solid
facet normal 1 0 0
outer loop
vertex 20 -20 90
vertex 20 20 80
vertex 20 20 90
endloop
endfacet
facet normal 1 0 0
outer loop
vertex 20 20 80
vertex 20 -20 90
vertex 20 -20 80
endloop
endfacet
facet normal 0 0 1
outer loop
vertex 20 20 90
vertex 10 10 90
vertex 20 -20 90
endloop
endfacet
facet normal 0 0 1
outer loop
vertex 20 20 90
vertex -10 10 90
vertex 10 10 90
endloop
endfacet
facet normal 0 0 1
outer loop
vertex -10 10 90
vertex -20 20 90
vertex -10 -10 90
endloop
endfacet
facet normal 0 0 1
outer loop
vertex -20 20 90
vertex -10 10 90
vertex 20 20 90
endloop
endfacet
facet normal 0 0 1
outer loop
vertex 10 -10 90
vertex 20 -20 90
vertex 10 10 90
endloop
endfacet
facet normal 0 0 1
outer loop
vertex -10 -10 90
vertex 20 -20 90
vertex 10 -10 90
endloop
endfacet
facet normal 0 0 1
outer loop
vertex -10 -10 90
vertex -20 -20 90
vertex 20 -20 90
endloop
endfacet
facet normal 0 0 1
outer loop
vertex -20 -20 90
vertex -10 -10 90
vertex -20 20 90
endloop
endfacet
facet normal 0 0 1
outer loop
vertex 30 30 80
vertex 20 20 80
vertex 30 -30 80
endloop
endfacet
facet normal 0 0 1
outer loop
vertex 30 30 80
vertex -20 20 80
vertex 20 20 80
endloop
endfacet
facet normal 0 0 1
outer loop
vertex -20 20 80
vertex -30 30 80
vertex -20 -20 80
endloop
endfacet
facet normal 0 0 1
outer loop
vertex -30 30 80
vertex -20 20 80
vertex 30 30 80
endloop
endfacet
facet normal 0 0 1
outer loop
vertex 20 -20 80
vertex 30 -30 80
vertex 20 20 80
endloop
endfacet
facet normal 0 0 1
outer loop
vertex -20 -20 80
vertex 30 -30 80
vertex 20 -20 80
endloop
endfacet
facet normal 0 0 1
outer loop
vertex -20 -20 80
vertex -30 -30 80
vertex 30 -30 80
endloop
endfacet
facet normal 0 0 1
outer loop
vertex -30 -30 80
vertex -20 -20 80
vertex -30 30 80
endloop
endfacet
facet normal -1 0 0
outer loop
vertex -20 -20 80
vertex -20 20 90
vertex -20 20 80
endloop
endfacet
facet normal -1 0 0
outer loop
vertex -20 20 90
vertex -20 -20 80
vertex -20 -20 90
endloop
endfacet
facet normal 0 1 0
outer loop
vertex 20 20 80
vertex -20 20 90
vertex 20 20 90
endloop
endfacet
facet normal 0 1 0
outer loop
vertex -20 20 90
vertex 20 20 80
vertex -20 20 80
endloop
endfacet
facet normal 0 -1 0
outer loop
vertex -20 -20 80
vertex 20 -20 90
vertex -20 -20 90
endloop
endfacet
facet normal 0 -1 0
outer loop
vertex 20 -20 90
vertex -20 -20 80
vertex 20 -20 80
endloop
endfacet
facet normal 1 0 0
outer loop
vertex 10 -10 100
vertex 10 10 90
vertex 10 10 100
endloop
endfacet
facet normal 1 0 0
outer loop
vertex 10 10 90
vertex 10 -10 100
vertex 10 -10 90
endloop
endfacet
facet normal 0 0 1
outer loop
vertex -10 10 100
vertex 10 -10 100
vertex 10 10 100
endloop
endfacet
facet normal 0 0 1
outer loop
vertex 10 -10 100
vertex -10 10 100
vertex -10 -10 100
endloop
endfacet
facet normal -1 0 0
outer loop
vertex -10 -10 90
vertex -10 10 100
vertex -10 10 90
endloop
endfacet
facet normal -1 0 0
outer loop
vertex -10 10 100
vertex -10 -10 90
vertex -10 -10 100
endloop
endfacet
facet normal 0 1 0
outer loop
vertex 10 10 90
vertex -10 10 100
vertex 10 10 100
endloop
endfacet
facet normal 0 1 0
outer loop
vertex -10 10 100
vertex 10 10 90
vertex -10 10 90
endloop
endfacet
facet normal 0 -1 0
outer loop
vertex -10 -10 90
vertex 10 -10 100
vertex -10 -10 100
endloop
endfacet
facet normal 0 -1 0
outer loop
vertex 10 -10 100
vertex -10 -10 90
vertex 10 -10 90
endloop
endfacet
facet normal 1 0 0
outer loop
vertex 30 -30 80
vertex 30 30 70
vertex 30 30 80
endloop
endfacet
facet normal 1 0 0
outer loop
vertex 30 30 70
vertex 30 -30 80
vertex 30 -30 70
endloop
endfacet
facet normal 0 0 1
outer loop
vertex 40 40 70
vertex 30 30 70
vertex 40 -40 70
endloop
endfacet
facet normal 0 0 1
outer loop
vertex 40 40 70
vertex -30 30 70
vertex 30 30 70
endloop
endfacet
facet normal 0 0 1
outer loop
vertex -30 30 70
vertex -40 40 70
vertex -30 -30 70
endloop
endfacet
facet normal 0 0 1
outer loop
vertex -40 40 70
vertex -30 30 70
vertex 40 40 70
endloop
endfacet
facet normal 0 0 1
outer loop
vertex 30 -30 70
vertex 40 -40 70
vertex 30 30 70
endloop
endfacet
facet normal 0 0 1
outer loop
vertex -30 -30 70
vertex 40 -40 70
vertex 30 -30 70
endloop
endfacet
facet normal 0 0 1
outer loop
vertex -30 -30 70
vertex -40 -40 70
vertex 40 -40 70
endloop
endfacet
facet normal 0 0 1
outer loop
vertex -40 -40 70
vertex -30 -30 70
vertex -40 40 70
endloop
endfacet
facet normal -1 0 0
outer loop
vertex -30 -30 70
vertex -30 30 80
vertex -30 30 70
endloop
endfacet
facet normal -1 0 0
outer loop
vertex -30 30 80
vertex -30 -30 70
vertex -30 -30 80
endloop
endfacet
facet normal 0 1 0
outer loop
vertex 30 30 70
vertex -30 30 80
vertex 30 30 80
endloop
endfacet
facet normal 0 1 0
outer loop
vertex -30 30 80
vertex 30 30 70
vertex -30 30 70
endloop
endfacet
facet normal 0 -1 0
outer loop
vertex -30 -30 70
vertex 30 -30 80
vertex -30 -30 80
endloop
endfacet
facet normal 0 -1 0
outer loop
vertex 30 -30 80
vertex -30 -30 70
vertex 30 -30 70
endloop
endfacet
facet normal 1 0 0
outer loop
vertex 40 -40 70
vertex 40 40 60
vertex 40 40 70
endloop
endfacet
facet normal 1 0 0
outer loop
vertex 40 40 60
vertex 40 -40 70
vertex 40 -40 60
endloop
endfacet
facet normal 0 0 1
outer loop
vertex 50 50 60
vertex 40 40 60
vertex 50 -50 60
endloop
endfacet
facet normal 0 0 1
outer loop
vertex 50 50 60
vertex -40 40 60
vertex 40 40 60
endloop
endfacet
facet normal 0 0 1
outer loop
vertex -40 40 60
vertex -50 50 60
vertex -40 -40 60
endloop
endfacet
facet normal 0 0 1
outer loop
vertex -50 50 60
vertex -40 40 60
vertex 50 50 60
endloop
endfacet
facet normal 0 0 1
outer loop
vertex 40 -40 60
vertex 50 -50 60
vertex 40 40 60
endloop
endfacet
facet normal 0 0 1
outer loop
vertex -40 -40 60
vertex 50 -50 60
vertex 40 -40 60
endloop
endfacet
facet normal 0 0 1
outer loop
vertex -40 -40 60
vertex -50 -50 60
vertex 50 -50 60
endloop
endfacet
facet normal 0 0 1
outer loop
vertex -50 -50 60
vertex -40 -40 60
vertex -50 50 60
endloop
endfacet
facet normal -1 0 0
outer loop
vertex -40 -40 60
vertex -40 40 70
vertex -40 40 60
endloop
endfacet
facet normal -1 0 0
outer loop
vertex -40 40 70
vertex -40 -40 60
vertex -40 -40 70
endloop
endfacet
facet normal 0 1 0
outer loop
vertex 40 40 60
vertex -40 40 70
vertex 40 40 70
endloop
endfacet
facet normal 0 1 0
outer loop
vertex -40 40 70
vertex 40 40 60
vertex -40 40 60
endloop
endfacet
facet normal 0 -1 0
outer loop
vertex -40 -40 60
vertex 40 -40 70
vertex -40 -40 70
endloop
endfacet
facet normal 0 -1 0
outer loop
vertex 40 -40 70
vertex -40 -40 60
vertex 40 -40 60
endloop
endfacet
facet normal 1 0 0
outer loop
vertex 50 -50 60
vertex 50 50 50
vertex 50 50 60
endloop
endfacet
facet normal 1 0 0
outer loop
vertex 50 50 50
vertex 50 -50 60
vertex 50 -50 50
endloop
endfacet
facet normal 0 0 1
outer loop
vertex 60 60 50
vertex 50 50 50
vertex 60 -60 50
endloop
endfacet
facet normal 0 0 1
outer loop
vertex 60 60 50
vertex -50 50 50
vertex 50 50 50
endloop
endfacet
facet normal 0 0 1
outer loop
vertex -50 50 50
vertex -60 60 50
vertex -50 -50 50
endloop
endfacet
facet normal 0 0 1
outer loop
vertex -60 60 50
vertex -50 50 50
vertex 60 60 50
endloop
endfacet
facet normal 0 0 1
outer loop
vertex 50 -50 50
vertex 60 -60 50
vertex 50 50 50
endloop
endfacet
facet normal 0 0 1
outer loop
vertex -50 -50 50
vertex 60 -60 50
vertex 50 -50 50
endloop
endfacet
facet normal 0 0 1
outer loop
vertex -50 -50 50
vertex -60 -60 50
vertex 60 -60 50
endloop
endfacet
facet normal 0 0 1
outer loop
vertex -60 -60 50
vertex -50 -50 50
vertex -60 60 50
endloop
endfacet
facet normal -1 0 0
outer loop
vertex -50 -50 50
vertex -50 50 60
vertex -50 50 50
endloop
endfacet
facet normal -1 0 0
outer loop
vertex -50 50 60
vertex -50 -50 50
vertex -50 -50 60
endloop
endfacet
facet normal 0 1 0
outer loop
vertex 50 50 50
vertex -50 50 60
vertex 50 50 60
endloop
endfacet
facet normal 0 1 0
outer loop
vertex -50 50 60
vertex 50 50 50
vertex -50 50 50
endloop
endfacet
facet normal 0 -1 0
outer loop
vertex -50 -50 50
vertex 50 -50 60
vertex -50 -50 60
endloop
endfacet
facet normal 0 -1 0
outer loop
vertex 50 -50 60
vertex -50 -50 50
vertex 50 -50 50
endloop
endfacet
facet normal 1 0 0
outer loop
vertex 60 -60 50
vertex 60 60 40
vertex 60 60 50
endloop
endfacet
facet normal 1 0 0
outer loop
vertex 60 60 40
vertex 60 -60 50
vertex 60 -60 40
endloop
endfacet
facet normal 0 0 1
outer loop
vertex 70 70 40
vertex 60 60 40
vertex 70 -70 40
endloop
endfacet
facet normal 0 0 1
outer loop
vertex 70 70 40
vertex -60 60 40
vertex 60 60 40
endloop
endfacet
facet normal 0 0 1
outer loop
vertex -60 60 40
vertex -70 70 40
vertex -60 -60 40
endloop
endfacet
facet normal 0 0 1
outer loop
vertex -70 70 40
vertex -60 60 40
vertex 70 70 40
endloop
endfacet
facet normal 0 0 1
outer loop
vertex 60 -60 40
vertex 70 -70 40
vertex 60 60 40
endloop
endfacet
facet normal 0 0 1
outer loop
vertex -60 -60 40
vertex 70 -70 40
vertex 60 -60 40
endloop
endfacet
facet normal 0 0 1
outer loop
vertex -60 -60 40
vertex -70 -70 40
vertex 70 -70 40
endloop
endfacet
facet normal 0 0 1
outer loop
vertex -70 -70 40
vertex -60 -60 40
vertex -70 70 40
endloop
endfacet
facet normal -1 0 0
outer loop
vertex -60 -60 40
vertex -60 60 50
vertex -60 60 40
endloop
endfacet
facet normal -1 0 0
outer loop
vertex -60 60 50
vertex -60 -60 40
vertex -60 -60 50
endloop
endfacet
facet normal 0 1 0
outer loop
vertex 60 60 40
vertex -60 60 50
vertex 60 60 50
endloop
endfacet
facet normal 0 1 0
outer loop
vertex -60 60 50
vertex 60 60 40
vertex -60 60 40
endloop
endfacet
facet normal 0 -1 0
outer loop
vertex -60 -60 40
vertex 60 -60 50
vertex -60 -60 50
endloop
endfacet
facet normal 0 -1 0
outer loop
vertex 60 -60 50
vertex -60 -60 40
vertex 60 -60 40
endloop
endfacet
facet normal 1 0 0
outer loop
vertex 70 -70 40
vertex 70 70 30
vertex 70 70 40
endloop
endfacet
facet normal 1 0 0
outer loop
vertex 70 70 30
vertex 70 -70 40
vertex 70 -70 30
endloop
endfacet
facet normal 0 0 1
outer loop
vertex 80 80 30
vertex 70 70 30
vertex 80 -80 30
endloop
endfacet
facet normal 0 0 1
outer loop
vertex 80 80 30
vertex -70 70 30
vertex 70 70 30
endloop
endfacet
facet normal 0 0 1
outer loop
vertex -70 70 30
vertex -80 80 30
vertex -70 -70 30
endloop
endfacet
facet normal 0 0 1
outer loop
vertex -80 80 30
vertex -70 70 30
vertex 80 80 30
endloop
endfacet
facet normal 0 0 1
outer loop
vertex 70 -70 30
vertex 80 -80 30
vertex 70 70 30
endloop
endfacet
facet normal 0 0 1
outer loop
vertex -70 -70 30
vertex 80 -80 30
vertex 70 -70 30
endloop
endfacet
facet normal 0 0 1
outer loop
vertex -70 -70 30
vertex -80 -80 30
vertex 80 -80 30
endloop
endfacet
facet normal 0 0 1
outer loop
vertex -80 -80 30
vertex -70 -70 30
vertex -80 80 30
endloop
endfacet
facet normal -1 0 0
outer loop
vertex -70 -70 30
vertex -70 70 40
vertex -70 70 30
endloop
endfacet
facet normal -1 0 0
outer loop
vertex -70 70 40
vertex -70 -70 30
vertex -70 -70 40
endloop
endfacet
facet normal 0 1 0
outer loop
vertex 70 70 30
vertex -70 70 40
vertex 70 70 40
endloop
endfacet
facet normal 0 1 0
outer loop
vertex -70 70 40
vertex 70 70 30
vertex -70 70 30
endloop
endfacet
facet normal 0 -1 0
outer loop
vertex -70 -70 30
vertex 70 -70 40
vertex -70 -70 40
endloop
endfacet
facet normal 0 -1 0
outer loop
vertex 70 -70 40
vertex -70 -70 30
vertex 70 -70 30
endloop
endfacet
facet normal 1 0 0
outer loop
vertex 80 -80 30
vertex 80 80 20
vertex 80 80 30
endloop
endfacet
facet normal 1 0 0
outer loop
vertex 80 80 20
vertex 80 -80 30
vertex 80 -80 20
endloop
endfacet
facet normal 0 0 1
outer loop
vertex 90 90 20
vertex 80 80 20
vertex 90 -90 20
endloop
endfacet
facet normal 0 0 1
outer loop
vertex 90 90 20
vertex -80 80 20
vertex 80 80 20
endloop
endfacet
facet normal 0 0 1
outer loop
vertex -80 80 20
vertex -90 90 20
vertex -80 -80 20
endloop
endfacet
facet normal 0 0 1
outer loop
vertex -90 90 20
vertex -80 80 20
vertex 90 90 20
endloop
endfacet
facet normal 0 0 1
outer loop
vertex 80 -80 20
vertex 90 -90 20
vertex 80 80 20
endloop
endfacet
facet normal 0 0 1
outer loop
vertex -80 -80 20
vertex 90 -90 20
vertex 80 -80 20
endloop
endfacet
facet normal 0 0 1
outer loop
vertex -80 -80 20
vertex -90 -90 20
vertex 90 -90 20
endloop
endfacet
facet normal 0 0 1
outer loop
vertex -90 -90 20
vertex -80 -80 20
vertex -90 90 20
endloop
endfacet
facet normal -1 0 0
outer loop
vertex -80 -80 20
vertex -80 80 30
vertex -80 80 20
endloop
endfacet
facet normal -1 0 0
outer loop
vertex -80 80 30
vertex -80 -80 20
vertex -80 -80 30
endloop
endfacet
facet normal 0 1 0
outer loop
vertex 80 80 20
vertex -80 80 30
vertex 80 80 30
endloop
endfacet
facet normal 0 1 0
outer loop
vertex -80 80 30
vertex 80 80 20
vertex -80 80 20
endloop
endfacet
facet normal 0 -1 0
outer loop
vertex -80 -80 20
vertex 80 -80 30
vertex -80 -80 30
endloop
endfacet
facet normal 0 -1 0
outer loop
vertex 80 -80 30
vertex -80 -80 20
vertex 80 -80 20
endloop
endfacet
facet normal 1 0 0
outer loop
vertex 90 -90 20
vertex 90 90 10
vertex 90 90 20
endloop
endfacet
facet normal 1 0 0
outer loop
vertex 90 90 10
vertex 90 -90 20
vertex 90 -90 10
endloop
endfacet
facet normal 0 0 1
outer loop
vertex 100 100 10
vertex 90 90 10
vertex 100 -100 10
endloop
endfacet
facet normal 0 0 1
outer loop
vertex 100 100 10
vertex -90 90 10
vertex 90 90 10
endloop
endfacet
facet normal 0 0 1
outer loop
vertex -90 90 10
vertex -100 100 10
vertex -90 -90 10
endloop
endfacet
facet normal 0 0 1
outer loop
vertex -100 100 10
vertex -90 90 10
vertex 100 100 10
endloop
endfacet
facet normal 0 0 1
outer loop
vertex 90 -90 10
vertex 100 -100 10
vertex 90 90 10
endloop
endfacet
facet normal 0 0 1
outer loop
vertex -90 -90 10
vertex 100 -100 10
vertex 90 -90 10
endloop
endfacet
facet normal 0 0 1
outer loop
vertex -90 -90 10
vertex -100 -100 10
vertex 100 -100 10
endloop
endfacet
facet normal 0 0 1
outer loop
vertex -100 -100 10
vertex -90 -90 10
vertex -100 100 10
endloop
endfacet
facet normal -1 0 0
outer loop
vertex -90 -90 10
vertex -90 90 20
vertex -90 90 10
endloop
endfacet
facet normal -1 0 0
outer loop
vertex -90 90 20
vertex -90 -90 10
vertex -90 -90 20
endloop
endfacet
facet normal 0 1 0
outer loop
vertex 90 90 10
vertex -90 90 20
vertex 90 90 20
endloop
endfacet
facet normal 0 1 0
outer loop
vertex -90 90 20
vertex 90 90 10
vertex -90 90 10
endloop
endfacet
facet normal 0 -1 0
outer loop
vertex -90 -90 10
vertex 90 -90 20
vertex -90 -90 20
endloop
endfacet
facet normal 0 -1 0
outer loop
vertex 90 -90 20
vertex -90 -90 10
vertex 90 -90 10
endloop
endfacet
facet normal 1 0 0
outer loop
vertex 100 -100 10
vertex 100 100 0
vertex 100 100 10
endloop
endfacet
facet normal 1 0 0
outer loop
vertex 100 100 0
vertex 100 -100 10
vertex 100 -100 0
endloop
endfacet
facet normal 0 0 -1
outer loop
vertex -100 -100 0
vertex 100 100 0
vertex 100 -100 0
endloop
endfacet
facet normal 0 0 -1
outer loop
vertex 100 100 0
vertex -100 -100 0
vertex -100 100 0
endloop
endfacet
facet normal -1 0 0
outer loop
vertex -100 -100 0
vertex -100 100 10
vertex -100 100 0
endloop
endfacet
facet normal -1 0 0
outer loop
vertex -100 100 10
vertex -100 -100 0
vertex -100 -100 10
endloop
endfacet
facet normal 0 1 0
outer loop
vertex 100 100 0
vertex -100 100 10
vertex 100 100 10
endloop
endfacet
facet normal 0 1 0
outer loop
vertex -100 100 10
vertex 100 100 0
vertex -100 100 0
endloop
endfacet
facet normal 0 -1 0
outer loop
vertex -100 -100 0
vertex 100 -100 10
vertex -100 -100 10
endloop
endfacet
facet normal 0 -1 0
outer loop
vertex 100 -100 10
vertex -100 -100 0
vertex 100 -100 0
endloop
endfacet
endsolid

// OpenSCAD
// Ejemplo de uso de la recursividad y los condicionales.
// En este ejercicio, dibujaremos una pirámide de manera rápida utilizando
// la recursividad
module piramide(n, h=0, boxel=20){
    altura = boxel/2;
    translate([0,0,(altura/2)+h])
        cube([boxel*n, boxel*n, altura], center=true);
    if(n>1){
            piramide(n-1, altura+h);
        }
    }
  
// Ejemplo de uso  
piramide(10);
